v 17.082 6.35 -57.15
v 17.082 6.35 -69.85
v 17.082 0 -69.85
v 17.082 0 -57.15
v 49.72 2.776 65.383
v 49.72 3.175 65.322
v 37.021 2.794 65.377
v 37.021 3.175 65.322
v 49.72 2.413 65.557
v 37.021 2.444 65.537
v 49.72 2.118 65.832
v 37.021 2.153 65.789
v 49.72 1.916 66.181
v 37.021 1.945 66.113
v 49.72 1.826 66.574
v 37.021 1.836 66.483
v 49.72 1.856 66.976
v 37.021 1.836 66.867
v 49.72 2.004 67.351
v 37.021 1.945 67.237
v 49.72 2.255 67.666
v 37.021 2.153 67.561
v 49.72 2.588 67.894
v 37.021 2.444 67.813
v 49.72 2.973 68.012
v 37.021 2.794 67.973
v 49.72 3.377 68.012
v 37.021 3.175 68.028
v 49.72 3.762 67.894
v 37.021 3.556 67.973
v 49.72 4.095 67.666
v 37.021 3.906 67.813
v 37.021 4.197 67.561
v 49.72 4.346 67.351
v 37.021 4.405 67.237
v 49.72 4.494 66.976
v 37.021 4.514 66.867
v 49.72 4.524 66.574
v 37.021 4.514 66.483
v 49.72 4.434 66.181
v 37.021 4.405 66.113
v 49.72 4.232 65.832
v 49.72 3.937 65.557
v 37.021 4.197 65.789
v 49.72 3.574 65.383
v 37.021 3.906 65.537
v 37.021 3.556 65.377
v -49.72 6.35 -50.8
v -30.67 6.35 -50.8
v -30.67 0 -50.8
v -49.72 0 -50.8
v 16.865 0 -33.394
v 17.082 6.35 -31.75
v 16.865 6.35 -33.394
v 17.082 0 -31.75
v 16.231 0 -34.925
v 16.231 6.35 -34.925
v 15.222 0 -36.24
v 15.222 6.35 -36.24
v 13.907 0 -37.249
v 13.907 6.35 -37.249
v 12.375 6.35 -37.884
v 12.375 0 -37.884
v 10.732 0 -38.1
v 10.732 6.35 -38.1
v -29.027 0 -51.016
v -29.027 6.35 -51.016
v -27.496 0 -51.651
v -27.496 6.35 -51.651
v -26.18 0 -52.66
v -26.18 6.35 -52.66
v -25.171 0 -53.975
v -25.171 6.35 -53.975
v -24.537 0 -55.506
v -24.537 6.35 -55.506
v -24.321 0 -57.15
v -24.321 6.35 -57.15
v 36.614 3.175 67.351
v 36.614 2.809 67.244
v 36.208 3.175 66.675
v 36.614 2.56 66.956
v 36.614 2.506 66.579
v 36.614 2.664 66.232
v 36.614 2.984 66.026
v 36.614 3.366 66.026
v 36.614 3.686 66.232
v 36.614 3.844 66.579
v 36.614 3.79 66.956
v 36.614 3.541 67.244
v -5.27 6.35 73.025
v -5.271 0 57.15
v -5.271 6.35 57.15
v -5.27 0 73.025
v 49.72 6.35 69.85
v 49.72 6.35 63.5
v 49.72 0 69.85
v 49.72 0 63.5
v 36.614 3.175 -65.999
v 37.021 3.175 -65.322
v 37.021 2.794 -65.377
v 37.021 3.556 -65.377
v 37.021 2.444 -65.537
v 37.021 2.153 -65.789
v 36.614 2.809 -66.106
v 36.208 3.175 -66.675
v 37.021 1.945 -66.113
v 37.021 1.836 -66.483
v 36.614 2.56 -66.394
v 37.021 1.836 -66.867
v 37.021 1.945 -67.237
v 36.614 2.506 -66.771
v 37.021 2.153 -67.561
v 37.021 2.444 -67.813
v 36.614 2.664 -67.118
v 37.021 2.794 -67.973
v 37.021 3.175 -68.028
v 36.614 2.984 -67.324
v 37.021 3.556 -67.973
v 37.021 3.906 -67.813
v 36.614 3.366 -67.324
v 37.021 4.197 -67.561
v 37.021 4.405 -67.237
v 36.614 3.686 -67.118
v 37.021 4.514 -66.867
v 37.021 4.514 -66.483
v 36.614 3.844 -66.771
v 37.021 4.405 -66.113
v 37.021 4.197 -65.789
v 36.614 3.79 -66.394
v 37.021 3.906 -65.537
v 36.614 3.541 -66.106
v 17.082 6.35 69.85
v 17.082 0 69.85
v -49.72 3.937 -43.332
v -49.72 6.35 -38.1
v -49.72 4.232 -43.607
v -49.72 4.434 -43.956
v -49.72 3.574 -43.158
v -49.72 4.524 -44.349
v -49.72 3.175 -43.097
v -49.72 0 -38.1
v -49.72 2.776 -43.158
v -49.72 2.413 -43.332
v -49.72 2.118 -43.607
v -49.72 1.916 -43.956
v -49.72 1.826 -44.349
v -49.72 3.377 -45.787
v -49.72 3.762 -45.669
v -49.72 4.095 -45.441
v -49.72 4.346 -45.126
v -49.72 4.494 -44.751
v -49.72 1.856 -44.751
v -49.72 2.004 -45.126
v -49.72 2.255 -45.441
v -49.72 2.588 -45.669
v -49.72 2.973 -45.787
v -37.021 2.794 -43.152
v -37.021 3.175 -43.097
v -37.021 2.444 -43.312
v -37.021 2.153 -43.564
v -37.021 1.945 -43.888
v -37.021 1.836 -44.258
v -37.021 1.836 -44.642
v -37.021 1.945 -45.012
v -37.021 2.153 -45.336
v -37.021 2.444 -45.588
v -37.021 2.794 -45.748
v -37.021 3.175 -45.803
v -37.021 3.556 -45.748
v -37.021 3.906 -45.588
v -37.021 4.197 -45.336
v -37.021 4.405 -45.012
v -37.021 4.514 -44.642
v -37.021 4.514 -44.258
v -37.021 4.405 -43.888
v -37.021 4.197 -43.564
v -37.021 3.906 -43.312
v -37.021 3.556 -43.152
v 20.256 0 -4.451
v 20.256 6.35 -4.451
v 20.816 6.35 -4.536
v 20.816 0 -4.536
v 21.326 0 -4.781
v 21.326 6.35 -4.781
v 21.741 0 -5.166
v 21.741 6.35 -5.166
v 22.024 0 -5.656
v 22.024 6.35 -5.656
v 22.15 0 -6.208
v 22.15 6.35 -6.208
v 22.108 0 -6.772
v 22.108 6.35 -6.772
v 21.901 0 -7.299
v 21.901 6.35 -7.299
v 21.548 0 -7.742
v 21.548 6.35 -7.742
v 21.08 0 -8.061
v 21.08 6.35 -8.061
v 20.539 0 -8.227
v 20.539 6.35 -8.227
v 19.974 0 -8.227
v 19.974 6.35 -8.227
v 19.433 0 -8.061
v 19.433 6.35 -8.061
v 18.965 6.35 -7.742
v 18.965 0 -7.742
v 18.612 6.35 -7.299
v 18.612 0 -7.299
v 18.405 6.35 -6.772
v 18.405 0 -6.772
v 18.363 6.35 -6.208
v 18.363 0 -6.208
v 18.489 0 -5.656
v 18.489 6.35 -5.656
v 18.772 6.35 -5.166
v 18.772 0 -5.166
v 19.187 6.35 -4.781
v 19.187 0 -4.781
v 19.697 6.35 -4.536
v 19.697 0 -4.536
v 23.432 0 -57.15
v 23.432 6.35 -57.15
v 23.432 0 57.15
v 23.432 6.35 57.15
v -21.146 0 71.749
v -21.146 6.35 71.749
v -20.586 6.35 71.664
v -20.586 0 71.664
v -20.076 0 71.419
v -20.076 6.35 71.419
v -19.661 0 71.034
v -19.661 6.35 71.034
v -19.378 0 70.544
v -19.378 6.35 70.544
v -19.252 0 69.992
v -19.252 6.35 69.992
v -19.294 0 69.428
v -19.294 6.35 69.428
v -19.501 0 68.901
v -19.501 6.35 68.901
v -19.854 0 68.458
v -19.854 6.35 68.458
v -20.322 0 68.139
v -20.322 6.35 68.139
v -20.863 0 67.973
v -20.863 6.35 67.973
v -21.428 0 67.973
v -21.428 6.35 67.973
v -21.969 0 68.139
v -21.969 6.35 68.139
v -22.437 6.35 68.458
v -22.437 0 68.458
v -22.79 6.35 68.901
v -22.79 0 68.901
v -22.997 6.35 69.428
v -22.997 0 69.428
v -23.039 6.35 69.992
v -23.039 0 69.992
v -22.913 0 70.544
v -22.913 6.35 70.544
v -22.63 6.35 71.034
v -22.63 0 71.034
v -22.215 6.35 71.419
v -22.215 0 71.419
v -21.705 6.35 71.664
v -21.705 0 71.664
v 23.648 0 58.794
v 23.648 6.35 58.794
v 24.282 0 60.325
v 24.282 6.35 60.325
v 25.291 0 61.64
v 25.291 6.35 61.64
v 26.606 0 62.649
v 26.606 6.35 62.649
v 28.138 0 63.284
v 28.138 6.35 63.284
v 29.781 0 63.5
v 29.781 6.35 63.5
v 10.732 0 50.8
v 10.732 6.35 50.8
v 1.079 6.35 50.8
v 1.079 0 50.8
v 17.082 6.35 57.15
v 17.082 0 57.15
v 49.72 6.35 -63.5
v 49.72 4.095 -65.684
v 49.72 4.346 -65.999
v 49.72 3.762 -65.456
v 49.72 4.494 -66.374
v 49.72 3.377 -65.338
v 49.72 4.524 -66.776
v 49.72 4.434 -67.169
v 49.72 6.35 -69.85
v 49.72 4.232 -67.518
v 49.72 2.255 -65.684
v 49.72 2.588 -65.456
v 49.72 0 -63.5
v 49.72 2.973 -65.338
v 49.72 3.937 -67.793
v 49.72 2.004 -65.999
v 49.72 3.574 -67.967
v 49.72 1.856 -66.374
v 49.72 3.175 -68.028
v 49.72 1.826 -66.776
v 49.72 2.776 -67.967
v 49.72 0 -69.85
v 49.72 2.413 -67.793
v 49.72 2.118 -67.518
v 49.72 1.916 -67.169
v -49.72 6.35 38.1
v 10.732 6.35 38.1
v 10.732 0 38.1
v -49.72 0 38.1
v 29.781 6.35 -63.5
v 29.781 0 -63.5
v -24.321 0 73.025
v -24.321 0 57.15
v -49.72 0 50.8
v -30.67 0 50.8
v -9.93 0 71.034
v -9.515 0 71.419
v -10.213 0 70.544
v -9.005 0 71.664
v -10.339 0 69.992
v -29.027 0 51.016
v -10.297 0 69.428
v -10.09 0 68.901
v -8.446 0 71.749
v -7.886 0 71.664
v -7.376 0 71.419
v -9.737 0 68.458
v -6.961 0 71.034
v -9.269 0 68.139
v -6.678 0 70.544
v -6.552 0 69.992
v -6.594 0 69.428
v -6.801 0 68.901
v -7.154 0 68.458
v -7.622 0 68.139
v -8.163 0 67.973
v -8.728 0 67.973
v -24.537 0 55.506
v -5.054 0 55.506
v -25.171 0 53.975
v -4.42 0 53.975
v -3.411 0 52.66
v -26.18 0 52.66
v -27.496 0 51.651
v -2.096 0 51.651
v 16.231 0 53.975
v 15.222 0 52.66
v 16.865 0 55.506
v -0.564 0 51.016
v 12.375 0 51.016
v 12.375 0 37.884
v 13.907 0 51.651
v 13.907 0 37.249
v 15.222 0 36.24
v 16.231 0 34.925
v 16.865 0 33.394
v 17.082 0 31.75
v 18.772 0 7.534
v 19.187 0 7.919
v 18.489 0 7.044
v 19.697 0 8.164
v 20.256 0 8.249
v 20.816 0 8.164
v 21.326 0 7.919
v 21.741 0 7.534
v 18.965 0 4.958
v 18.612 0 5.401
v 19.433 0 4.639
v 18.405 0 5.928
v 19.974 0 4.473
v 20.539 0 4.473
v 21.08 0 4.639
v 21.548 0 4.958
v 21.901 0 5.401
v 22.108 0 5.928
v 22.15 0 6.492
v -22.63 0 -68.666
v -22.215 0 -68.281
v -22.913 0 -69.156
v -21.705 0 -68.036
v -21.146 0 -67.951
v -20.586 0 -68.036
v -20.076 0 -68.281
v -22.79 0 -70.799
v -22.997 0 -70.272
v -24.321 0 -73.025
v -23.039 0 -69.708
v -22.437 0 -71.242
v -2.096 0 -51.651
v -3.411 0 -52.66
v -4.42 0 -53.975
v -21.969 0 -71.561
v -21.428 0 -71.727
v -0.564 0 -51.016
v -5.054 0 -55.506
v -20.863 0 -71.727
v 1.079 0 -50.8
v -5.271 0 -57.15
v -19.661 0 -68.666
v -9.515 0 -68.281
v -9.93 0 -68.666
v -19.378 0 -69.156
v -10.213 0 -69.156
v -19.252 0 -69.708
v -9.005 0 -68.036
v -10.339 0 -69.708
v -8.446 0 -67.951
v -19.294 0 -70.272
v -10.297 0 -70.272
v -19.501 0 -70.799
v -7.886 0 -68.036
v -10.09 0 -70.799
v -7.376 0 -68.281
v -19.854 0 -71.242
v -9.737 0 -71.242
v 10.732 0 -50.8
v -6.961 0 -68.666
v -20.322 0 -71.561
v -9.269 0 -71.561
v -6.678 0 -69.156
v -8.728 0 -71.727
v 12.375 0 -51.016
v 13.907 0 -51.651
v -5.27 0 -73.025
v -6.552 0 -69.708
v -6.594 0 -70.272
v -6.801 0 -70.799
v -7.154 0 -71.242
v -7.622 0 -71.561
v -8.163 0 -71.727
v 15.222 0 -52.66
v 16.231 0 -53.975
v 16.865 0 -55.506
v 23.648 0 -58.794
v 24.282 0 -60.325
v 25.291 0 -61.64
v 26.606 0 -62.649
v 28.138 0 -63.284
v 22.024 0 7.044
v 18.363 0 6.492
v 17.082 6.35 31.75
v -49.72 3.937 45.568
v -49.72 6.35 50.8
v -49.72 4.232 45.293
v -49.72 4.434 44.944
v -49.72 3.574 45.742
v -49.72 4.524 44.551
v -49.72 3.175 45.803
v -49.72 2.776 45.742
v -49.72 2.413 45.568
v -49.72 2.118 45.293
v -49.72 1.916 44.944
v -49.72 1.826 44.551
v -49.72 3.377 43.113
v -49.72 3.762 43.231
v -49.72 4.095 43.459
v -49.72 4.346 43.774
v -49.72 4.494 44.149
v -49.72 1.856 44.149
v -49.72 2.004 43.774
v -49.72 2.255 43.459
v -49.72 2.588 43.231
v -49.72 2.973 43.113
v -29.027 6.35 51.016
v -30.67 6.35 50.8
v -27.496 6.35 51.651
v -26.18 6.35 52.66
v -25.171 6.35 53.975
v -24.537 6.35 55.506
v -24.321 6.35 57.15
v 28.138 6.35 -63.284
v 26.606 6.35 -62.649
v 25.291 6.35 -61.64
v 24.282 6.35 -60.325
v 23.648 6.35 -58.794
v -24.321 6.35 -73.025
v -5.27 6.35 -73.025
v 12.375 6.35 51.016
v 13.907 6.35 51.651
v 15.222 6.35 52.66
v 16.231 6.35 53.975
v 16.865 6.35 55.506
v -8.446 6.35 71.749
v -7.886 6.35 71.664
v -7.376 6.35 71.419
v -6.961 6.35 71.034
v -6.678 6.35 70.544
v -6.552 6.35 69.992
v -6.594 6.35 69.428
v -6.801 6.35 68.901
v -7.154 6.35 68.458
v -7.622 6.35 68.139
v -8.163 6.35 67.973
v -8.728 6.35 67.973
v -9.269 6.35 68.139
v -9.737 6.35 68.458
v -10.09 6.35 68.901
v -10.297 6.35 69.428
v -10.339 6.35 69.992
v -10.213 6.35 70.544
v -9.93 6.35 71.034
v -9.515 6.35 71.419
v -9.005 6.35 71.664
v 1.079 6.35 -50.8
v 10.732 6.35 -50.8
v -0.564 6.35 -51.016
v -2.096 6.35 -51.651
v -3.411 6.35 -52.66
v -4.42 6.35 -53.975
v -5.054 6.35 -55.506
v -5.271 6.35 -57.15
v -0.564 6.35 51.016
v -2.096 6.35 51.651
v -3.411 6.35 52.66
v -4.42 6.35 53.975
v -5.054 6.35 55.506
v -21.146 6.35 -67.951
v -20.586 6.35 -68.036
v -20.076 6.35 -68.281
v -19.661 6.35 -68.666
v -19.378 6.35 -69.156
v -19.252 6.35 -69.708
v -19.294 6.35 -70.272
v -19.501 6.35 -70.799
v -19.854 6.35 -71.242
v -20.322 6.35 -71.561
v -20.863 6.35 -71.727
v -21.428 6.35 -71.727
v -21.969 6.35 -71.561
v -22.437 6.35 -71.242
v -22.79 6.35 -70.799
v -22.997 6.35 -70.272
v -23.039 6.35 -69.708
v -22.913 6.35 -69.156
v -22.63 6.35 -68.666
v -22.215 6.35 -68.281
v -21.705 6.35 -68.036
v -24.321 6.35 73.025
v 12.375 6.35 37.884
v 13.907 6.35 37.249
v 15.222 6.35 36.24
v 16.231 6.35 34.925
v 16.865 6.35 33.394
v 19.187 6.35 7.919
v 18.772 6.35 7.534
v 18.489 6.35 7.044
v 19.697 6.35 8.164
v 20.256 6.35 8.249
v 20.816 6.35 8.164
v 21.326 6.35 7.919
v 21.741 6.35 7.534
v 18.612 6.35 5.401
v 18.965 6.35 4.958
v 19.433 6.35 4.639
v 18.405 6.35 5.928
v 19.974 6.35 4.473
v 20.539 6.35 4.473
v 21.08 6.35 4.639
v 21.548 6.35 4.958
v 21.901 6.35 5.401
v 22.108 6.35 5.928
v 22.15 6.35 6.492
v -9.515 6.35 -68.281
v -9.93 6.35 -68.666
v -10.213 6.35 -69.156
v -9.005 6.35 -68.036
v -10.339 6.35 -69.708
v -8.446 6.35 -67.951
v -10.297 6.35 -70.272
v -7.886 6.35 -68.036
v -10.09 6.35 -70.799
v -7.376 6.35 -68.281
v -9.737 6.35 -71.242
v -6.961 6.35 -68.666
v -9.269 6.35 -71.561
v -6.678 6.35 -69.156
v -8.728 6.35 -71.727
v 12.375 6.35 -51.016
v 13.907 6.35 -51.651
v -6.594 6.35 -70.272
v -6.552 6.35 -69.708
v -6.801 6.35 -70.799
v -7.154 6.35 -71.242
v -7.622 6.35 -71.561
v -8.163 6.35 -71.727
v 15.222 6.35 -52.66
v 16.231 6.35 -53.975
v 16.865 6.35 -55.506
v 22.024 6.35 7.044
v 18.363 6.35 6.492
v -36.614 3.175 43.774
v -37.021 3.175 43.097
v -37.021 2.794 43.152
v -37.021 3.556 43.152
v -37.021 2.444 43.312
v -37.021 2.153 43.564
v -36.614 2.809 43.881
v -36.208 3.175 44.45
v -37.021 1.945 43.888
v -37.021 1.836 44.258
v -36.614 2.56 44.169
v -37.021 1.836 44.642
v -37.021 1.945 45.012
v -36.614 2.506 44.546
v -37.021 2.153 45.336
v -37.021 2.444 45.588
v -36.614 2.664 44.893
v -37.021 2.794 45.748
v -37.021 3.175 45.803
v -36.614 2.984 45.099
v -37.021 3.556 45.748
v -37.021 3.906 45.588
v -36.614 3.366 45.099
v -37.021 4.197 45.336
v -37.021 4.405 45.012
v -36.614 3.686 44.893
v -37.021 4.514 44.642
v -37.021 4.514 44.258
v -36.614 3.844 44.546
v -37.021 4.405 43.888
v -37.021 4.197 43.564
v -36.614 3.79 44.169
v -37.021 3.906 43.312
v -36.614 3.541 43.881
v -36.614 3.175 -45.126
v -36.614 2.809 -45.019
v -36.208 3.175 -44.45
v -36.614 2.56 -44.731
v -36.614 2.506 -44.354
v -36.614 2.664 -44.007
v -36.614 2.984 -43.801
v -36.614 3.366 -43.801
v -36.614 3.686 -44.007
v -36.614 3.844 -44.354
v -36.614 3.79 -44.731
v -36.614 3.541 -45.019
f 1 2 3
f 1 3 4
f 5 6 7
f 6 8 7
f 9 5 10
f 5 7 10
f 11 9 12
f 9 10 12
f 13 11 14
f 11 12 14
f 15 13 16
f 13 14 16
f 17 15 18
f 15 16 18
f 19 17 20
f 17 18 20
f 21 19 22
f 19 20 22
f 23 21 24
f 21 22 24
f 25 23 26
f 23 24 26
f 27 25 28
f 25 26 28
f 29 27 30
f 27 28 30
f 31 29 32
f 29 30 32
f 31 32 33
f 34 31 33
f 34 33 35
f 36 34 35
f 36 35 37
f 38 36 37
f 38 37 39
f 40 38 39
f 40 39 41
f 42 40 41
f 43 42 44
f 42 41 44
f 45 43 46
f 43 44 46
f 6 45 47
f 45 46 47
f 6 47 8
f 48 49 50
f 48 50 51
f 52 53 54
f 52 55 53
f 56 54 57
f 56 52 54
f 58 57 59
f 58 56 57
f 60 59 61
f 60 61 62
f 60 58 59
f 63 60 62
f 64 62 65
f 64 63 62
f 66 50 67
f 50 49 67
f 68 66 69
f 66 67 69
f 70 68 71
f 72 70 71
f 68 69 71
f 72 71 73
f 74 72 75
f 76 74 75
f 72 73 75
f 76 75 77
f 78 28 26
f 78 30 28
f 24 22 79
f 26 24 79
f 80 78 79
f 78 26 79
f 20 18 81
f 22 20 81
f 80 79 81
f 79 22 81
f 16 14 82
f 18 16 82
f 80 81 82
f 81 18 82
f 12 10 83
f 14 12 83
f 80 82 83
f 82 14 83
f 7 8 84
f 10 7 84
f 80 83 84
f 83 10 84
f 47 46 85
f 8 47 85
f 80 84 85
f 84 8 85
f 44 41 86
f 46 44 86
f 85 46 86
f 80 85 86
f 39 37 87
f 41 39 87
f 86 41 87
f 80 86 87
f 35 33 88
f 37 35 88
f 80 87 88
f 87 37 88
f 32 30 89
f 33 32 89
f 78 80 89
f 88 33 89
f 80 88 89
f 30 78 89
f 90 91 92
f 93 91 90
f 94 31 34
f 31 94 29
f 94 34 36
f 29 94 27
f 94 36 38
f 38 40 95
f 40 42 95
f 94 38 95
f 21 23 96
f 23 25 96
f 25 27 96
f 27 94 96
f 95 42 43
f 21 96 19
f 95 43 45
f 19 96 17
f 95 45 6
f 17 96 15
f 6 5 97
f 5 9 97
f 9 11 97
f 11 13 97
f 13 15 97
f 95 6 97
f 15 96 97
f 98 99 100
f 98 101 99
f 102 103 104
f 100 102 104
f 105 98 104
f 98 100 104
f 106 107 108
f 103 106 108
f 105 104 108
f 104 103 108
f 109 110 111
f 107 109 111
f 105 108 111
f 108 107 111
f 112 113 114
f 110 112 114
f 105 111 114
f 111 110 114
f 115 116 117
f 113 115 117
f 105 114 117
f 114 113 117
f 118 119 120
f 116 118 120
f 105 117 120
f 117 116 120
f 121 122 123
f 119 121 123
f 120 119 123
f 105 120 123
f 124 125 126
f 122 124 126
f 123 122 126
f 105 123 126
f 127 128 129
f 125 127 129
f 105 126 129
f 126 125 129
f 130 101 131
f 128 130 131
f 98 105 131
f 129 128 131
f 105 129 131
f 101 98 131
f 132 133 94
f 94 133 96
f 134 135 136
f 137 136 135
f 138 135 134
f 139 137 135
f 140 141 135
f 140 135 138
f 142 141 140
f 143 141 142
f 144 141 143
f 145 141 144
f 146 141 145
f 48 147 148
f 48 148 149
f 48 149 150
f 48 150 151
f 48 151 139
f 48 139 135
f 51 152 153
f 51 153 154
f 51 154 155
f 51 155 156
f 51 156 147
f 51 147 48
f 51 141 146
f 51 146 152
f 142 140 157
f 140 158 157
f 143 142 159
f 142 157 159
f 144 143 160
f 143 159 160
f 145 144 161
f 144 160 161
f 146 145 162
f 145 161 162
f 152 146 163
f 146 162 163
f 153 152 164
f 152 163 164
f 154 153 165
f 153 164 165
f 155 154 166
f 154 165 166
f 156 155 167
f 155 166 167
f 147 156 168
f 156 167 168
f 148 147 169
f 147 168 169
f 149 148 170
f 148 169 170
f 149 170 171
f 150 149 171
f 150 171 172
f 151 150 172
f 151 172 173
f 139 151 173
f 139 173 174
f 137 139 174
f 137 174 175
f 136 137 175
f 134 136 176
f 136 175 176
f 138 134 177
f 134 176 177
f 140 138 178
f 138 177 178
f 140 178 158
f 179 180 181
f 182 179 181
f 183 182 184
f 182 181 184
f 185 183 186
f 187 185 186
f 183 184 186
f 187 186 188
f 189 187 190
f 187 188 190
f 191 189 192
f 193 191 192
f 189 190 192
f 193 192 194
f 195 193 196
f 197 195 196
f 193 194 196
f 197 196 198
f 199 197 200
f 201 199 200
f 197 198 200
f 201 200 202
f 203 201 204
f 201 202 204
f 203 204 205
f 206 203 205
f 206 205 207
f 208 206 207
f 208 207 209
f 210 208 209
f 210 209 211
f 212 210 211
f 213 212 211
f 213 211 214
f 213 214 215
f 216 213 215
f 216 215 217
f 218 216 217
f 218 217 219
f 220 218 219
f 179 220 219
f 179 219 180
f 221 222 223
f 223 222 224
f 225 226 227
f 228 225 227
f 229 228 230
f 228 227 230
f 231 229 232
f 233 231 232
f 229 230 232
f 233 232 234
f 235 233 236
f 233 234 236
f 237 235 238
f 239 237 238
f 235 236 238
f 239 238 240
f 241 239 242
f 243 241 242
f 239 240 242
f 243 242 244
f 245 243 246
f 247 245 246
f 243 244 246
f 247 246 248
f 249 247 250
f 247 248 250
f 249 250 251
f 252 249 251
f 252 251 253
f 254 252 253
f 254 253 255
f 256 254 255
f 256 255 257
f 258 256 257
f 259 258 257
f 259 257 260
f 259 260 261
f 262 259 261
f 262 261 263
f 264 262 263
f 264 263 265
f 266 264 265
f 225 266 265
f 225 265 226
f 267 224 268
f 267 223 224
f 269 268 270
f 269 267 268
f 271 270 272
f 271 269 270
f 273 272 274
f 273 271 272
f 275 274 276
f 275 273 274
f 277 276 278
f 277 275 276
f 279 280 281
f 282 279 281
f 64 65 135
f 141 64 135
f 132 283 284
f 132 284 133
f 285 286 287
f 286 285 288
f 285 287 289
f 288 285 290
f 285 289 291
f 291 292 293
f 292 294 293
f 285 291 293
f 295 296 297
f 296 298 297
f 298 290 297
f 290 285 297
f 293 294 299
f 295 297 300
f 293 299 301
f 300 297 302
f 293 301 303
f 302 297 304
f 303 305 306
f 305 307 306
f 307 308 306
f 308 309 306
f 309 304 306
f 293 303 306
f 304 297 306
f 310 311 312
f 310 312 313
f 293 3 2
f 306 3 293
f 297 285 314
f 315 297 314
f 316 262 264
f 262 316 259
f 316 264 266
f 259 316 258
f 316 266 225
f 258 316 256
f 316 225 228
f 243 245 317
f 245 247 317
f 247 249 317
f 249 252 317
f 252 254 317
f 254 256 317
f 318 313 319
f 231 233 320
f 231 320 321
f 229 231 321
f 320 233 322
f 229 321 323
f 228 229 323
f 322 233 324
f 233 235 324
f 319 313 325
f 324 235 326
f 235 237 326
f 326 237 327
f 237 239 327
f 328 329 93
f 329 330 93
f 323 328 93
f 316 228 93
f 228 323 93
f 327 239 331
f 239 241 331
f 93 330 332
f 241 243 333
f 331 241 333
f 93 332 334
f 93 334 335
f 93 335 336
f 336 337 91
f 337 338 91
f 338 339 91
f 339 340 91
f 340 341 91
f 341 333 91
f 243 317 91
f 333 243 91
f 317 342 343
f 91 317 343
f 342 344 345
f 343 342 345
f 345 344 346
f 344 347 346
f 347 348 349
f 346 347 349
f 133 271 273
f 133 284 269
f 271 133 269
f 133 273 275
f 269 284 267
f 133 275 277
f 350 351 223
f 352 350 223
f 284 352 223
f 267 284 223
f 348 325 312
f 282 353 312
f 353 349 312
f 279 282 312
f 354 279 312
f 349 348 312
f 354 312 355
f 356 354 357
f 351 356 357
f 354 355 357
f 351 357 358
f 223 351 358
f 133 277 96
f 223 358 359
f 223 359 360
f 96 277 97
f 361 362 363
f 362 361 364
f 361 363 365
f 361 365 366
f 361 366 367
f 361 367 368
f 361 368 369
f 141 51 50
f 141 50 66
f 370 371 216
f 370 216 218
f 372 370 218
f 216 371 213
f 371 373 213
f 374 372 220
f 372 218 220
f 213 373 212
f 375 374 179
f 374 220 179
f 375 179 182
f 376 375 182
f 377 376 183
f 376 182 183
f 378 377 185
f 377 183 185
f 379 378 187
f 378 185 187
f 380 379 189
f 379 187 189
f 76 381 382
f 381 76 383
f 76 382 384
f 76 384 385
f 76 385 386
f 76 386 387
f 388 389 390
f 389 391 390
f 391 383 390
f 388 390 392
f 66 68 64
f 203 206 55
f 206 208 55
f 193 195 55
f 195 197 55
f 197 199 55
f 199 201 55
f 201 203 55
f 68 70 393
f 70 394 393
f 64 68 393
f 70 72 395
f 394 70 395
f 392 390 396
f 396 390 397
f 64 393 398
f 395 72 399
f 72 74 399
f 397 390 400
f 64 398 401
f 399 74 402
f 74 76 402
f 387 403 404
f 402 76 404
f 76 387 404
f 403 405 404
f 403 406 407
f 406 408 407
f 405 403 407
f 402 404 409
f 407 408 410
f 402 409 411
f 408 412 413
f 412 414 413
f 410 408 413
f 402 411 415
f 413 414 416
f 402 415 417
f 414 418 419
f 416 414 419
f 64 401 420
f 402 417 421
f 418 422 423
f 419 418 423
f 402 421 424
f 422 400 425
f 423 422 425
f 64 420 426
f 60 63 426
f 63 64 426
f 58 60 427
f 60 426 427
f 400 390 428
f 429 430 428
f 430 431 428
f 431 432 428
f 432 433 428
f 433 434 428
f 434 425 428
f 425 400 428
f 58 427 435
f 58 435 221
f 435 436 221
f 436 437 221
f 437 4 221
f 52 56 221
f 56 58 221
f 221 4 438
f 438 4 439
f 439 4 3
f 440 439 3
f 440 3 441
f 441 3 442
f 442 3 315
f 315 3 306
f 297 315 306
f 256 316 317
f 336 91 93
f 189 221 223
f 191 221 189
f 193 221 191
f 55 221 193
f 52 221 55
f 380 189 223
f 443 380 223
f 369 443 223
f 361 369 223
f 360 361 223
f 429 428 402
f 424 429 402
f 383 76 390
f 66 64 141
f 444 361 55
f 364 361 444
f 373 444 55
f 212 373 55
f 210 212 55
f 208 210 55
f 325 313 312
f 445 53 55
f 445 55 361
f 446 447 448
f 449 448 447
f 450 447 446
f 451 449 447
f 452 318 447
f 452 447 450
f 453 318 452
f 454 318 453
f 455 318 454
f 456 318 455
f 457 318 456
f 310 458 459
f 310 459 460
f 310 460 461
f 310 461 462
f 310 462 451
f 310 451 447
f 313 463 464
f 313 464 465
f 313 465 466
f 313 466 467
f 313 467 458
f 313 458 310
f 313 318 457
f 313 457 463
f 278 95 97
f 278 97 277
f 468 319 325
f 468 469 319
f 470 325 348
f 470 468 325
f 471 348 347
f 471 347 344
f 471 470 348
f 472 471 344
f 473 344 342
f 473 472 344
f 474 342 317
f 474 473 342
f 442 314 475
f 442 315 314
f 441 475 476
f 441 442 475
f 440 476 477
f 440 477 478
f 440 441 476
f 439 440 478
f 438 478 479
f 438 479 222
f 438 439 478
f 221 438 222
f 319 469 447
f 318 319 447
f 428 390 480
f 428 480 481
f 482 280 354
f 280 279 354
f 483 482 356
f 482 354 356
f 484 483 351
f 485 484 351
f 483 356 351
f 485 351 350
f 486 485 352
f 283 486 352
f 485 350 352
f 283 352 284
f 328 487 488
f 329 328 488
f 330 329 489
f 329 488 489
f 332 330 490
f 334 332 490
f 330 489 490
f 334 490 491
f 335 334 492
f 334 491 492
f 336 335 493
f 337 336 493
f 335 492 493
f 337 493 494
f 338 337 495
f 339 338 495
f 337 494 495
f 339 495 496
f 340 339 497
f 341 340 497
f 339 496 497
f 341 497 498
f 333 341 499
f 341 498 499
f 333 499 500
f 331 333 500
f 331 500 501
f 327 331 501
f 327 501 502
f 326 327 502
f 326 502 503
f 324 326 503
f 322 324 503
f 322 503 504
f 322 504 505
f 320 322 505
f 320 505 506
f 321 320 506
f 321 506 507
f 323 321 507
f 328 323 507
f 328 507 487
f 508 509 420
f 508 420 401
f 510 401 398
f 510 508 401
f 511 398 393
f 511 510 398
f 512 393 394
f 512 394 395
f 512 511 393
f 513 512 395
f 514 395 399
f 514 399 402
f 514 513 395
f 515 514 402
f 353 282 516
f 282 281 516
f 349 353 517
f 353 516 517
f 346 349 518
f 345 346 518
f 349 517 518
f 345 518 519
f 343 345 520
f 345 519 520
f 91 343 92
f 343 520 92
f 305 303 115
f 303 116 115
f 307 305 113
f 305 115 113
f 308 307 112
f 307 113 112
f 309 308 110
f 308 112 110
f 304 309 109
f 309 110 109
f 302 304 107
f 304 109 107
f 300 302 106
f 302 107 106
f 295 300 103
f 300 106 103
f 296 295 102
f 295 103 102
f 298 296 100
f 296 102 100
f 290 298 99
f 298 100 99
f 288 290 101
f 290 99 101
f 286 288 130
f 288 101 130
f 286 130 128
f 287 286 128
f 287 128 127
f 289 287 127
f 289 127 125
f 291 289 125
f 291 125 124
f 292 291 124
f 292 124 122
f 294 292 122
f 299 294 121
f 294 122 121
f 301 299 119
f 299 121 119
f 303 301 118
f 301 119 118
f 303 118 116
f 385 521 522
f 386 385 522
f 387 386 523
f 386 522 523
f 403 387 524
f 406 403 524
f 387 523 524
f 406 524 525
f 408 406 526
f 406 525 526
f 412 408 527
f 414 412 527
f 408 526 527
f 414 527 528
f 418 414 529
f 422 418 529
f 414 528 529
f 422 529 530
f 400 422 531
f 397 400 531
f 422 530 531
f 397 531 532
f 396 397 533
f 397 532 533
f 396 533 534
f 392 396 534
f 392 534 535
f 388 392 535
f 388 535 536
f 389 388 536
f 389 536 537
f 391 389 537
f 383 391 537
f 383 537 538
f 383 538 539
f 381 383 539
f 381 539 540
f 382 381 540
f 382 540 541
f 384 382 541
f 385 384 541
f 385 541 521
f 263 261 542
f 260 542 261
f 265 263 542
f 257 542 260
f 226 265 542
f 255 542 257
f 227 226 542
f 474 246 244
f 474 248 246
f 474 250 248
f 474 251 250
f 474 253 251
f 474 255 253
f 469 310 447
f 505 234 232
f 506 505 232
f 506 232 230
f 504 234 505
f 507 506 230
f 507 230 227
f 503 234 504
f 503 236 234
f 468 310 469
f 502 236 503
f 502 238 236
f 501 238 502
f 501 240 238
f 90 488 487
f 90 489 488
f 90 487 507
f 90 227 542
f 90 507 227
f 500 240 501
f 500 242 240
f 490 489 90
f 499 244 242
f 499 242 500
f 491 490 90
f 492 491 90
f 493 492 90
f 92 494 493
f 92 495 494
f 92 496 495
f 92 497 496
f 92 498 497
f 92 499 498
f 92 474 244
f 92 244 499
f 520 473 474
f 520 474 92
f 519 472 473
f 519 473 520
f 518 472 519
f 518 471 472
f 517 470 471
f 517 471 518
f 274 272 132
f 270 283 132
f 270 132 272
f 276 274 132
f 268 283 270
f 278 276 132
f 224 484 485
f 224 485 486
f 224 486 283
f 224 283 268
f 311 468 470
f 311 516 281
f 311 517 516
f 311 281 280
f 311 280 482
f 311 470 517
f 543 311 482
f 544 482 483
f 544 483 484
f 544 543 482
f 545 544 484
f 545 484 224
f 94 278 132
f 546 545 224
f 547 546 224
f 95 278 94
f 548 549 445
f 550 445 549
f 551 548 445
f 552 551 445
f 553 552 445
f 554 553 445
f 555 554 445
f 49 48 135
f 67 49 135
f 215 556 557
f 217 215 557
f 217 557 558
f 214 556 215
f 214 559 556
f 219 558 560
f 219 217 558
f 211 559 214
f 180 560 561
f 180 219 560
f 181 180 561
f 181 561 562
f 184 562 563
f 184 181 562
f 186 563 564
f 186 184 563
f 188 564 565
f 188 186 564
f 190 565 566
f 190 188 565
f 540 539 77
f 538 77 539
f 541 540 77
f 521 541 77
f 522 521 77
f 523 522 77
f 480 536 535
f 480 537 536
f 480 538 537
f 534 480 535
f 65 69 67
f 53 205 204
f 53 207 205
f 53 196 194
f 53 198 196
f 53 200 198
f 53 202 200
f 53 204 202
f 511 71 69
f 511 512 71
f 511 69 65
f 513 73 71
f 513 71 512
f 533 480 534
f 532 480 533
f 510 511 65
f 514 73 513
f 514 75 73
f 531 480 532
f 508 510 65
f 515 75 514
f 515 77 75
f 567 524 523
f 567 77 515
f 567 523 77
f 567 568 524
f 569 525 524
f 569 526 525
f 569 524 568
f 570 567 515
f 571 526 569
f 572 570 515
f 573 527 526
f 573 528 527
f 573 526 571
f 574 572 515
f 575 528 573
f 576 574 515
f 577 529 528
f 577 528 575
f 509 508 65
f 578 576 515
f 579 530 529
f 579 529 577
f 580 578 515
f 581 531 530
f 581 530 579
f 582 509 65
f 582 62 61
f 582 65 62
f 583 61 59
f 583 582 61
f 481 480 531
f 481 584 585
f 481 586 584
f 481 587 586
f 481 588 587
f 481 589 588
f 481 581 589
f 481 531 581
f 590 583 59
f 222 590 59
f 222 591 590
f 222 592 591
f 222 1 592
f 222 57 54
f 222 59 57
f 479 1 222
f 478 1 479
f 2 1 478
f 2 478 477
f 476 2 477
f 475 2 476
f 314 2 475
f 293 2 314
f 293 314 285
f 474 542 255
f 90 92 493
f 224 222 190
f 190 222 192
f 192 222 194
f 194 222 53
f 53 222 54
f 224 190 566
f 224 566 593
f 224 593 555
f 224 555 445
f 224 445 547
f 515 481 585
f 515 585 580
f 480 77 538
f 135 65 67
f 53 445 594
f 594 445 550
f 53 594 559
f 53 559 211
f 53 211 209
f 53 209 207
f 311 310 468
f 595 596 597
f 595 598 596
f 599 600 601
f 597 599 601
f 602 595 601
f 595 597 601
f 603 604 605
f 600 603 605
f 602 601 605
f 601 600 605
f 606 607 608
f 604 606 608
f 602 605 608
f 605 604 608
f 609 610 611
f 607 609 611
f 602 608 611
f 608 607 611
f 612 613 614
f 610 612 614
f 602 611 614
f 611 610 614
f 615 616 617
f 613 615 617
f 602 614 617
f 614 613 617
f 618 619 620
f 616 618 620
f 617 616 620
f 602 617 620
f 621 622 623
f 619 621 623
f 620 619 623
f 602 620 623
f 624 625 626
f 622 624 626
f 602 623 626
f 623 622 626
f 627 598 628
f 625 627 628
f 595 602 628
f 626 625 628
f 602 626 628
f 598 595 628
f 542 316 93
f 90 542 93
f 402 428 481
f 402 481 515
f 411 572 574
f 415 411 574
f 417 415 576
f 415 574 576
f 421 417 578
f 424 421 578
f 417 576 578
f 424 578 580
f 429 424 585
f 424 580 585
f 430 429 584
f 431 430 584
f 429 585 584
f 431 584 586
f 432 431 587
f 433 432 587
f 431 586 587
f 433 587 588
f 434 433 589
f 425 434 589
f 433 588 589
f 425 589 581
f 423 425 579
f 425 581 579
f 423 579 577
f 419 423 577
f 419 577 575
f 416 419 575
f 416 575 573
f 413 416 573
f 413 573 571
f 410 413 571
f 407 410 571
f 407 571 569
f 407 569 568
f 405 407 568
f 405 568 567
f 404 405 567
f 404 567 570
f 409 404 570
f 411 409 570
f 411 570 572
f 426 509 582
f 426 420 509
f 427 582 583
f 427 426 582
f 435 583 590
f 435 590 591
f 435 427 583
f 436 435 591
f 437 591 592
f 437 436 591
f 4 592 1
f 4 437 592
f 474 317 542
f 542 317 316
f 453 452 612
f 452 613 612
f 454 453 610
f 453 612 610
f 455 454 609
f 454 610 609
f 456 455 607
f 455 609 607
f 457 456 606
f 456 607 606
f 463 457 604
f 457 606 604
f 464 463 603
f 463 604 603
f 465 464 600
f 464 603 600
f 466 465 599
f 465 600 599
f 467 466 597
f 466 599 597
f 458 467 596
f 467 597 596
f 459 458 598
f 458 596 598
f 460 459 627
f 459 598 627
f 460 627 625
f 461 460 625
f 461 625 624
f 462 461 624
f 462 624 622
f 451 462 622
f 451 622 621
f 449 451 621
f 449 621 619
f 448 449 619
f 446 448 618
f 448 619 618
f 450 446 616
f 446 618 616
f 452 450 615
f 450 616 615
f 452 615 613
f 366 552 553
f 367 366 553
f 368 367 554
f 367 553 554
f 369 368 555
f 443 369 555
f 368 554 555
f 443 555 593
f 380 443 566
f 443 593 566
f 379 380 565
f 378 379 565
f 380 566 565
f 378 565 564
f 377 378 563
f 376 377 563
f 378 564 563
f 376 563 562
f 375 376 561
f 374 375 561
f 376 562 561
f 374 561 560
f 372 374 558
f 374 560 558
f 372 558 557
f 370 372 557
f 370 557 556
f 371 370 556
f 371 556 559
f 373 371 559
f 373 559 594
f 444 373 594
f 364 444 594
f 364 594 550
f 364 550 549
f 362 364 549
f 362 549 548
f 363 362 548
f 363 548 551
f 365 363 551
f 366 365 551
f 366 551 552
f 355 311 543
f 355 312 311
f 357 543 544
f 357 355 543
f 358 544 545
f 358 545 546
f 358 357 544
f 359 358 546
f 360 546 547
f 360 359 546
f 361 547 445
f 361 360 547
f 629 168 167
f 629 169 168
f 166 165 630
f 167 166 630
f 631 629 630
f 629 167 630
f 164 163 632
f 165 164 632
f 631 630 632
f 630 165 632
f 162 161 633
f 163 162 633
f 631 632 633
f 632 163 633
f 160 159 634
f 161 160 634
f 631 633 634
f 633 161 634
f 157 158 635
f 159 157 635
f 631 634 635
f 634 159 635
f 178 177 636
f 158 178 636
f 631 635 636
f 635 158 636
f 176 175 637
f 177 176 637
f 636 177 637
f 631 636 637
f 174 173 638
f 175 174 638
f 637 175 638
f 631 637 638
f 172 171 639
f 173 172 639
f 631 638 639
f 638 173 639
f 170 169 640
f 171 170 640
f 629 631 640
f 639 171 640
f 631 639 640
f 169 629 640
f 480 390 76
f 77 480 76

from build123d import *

# Parameters (mm, degrees)
SKETCH1_W                  = 99.441
SKETCH1_H                  = 139.7
EXTRUDE1_DEPTH             = 6.35
SKETCH2_W                  = 66.802
SKETCH2_H                  = 19.05
SKETCH2_W_2                = 26.289
SKETCH2_H_2                = 127
SKETCH2_H_3                = 76.2
CUT_EXTRUDE1_DEPTH         = 6.35
FILLET1_R                  = 6.35
TAP_DRILL_FOR_6_TAP1_D     = 2.7051
TAP_DRILL_FOR_6_TAP1_DEPTH = 12.7
TAP_DRILL_FOR_6_TAP1_TIP   = 0.81269403
TAP_DRILL_FOR_6_TAP2_D     = 2.7051
TAP_DRILL_FOR_6_TAP2_DEPTH = 12.7
TAP_DRILL_FOR_6_TAP2_TIP   = 0.81269403
F_6_CLEARANCE_HOLE1_D      = 3.7973
F_6_CLEARANCE_HOLE1_DEPTH  = 12.7
F_6_CLEARANCE_HOLE1_TIP    = 1.140824014
SKETCH6_W                  = 19.05
SKETCH6_H                  = 22.225
EXTRUDE2_DEPTH             = 6.35
FILLET2_R                  = 6.35
F_6_CLEARANCE_HOLE2_D      = 3.7973
F_6_CLEARANCE_HOLE2_DEPTH  = 12.7
F_6_CLEARANCE_HOLE2_TIP    = 1.140824014


with BuildPart() as part:
    # Sketch1 → Extrude1 (new body)
    with BuildSketch(Plane(origin=(0, 0, 0), x_dir=(1, 0, 0), z_dir=(0, 1, 0))):
        Rectangle(SKETCH1_W, SKETCH1_H)
    extrude(amount=EXTRUDE1_DEPTH)

    # Sketch2 → Cut-Extrude1 (cut)
    with BuildSketch(Plane(origin=(0, 6.35, 0), x_dir=(-1, 0, 0), z_dir=(0, 1, 0))):
        with Locations((16.3195, -60.325)):
            Rectangle(SKETCH2_W, SKETCH2_H)
        with Locations((16.3195, 60.325)):
            Rectangle(SKETCH2_W, SKETCH2_H)
        with Locations((-36.576, 0)):
            Rectangle(SKETCH2_W_2, SKETCH2_H_2)
        with Locations((16.3195, 0)):
            Rectangle(SKETCH2_W, SKETCH2_H_3)
    extrude(amount=-CUT_EXTRUDE1_DEPTH, mode=Mode.SUBTRACT)

    # Fillet1
    fillet1_edges = [part.edges().sort_by_distance(p)[0] for p in [
        (17.0815, 3.175, -50.8),
        (17.0815, 3.175, 50.8),
        (23.4315, 3.175, 63.5),
        (23.4315, 3.175, -63.5),
        (17.0815, 3.175, -38.1),
        (17.0815, 3.175, 38.1),
    ]]
    fillet(fillet1_edges, radius=FILLET1_R)

    # Tap Drill for #6 Tap1
    with Locations(Plane(origin=(-49.7205, 3.175, -44.45), x_dir=(0, 0, -1), z_dir=(-1, 0, 0))):
        with Locations((0, 0), (-88.9, 0)):
            Hole(TAP_DRILL_FOR_6_TAP1_D / 2, depth=TAP_DRILL_FOR_6_TAP1_DEPTH)
            with Locations((0, 0, -(TAP_DRILL_FOR_6_TAP1_DEPTH + TAP_DRILL_FOR_6_TAP1_TIP / 2))):  # 118° drill point
                Cone(0, TAP_DRILL_FOR_6_TAP1_D / 2, TAP_DRILL_FOR_6_TAP1_TIP, mode=Mode.SUBTRACT)

    # Tap Drill for #6 Tap2
    with Locations(Plane(origin=(49.7205, 3.175, -66.675), x_dir=(0, 0, 1), z_dir=(1, 0, 0))):
        with Locations((0, 0), (133.35, 0)):
            Hole(TAP_DRILL_FOR_6_TAP2_D / 2, depth=TAP_DRILL_FOR_6_TAP2_DEPTH)
            with Locations((0, 0, -(TAP_DRILL_FOR_6_TAP2_DEPTH + TAP_DRILL_FOR_6_TAP2_TIP / 2))):  # 118° drill point
                Cone(0, TAP_DRILL_FOR_6_TAP2_D / 2, TAP_DRILL_FOR_6_TAP2_TIP, mode=Mode.SUBTRACT)

    # #6 Clearance Hole1
    with Locations(Plane(origin=(20.2565, 0, 6.35), x_dir=(0, 0, -1), z_dir=(0, -1, 0))):
        with Locations((0, 0), (12.7, 0)):
            Hole(F_6_CLEARANCE_HOLE1_D / 2, depth=F_6_CLEARANCE_HOLE1_DEPTH)
            with Locations((0, 0, -(F_6_CLEARANCE_HOLE1_DEPTH + F_6_CLEARANCE_HOLE1_TIP / 2))):  # 118° drill point
                Cone(0, F_6_CLEARANCE_HOLE1_D / 2, F_6_CLEARANCE_HOLE1_TIP, mode=Mode.SUBTRACT)

    # Sketch6 → Extrude2 (add)
    with BuildSketch(Plane.XZ):
        with Locations((-14.7955, 61.9125)):
            Rectangle(SKETCH6_W, SKETCH6_H)
        with Locations((-14.7955, -61.9125)):
            Rectangle(SKETCH6_W, SKETCH6_H)
    extrude(amount=-EXTRUDE2_DEPTH)

    # Fillet2
    fillet2_edges = [part.edges().sort_by_distance(p)[0] for p in [
        (-5.2705, 3.175, 50.8),
        (-24.3205, 3.175, 50.8),
        (-5.2705, 3.175, -50.8),
        (-24.3205, 3.175, -50.8),
    ]]
    fillet(fillet2_edges, radius=FILLET2_R)

    # #6 Clearance Hole2
    with Locations(Plane(origin=(-8.4455, 0, 69.85), x_dir=(0, 0, -1), z_dir=(0, -1, 0))):
        with Locations((0, 0), (139.7, -12.7), (0, -12.7), (139.7, 0)):
            Hole(F_6_CLEARANCE_HOLE2_D / 2, depth=F_6_CLEARANCE_HOLE2_DEPTH)
            with Locations((0, 0, -(F_6_CLEARANCE_HOLE2_DEPTH + F_6_CLEARANCE_HOLE2_TIP / 2))):  # 118° drill point
                Cone(0, F_6_CLEARANCE_HOLE2_D / 2, F_6_CLEARANCE_HOLE2_TIP, mode=Mode.SUBTRACT)


solid = part.part
